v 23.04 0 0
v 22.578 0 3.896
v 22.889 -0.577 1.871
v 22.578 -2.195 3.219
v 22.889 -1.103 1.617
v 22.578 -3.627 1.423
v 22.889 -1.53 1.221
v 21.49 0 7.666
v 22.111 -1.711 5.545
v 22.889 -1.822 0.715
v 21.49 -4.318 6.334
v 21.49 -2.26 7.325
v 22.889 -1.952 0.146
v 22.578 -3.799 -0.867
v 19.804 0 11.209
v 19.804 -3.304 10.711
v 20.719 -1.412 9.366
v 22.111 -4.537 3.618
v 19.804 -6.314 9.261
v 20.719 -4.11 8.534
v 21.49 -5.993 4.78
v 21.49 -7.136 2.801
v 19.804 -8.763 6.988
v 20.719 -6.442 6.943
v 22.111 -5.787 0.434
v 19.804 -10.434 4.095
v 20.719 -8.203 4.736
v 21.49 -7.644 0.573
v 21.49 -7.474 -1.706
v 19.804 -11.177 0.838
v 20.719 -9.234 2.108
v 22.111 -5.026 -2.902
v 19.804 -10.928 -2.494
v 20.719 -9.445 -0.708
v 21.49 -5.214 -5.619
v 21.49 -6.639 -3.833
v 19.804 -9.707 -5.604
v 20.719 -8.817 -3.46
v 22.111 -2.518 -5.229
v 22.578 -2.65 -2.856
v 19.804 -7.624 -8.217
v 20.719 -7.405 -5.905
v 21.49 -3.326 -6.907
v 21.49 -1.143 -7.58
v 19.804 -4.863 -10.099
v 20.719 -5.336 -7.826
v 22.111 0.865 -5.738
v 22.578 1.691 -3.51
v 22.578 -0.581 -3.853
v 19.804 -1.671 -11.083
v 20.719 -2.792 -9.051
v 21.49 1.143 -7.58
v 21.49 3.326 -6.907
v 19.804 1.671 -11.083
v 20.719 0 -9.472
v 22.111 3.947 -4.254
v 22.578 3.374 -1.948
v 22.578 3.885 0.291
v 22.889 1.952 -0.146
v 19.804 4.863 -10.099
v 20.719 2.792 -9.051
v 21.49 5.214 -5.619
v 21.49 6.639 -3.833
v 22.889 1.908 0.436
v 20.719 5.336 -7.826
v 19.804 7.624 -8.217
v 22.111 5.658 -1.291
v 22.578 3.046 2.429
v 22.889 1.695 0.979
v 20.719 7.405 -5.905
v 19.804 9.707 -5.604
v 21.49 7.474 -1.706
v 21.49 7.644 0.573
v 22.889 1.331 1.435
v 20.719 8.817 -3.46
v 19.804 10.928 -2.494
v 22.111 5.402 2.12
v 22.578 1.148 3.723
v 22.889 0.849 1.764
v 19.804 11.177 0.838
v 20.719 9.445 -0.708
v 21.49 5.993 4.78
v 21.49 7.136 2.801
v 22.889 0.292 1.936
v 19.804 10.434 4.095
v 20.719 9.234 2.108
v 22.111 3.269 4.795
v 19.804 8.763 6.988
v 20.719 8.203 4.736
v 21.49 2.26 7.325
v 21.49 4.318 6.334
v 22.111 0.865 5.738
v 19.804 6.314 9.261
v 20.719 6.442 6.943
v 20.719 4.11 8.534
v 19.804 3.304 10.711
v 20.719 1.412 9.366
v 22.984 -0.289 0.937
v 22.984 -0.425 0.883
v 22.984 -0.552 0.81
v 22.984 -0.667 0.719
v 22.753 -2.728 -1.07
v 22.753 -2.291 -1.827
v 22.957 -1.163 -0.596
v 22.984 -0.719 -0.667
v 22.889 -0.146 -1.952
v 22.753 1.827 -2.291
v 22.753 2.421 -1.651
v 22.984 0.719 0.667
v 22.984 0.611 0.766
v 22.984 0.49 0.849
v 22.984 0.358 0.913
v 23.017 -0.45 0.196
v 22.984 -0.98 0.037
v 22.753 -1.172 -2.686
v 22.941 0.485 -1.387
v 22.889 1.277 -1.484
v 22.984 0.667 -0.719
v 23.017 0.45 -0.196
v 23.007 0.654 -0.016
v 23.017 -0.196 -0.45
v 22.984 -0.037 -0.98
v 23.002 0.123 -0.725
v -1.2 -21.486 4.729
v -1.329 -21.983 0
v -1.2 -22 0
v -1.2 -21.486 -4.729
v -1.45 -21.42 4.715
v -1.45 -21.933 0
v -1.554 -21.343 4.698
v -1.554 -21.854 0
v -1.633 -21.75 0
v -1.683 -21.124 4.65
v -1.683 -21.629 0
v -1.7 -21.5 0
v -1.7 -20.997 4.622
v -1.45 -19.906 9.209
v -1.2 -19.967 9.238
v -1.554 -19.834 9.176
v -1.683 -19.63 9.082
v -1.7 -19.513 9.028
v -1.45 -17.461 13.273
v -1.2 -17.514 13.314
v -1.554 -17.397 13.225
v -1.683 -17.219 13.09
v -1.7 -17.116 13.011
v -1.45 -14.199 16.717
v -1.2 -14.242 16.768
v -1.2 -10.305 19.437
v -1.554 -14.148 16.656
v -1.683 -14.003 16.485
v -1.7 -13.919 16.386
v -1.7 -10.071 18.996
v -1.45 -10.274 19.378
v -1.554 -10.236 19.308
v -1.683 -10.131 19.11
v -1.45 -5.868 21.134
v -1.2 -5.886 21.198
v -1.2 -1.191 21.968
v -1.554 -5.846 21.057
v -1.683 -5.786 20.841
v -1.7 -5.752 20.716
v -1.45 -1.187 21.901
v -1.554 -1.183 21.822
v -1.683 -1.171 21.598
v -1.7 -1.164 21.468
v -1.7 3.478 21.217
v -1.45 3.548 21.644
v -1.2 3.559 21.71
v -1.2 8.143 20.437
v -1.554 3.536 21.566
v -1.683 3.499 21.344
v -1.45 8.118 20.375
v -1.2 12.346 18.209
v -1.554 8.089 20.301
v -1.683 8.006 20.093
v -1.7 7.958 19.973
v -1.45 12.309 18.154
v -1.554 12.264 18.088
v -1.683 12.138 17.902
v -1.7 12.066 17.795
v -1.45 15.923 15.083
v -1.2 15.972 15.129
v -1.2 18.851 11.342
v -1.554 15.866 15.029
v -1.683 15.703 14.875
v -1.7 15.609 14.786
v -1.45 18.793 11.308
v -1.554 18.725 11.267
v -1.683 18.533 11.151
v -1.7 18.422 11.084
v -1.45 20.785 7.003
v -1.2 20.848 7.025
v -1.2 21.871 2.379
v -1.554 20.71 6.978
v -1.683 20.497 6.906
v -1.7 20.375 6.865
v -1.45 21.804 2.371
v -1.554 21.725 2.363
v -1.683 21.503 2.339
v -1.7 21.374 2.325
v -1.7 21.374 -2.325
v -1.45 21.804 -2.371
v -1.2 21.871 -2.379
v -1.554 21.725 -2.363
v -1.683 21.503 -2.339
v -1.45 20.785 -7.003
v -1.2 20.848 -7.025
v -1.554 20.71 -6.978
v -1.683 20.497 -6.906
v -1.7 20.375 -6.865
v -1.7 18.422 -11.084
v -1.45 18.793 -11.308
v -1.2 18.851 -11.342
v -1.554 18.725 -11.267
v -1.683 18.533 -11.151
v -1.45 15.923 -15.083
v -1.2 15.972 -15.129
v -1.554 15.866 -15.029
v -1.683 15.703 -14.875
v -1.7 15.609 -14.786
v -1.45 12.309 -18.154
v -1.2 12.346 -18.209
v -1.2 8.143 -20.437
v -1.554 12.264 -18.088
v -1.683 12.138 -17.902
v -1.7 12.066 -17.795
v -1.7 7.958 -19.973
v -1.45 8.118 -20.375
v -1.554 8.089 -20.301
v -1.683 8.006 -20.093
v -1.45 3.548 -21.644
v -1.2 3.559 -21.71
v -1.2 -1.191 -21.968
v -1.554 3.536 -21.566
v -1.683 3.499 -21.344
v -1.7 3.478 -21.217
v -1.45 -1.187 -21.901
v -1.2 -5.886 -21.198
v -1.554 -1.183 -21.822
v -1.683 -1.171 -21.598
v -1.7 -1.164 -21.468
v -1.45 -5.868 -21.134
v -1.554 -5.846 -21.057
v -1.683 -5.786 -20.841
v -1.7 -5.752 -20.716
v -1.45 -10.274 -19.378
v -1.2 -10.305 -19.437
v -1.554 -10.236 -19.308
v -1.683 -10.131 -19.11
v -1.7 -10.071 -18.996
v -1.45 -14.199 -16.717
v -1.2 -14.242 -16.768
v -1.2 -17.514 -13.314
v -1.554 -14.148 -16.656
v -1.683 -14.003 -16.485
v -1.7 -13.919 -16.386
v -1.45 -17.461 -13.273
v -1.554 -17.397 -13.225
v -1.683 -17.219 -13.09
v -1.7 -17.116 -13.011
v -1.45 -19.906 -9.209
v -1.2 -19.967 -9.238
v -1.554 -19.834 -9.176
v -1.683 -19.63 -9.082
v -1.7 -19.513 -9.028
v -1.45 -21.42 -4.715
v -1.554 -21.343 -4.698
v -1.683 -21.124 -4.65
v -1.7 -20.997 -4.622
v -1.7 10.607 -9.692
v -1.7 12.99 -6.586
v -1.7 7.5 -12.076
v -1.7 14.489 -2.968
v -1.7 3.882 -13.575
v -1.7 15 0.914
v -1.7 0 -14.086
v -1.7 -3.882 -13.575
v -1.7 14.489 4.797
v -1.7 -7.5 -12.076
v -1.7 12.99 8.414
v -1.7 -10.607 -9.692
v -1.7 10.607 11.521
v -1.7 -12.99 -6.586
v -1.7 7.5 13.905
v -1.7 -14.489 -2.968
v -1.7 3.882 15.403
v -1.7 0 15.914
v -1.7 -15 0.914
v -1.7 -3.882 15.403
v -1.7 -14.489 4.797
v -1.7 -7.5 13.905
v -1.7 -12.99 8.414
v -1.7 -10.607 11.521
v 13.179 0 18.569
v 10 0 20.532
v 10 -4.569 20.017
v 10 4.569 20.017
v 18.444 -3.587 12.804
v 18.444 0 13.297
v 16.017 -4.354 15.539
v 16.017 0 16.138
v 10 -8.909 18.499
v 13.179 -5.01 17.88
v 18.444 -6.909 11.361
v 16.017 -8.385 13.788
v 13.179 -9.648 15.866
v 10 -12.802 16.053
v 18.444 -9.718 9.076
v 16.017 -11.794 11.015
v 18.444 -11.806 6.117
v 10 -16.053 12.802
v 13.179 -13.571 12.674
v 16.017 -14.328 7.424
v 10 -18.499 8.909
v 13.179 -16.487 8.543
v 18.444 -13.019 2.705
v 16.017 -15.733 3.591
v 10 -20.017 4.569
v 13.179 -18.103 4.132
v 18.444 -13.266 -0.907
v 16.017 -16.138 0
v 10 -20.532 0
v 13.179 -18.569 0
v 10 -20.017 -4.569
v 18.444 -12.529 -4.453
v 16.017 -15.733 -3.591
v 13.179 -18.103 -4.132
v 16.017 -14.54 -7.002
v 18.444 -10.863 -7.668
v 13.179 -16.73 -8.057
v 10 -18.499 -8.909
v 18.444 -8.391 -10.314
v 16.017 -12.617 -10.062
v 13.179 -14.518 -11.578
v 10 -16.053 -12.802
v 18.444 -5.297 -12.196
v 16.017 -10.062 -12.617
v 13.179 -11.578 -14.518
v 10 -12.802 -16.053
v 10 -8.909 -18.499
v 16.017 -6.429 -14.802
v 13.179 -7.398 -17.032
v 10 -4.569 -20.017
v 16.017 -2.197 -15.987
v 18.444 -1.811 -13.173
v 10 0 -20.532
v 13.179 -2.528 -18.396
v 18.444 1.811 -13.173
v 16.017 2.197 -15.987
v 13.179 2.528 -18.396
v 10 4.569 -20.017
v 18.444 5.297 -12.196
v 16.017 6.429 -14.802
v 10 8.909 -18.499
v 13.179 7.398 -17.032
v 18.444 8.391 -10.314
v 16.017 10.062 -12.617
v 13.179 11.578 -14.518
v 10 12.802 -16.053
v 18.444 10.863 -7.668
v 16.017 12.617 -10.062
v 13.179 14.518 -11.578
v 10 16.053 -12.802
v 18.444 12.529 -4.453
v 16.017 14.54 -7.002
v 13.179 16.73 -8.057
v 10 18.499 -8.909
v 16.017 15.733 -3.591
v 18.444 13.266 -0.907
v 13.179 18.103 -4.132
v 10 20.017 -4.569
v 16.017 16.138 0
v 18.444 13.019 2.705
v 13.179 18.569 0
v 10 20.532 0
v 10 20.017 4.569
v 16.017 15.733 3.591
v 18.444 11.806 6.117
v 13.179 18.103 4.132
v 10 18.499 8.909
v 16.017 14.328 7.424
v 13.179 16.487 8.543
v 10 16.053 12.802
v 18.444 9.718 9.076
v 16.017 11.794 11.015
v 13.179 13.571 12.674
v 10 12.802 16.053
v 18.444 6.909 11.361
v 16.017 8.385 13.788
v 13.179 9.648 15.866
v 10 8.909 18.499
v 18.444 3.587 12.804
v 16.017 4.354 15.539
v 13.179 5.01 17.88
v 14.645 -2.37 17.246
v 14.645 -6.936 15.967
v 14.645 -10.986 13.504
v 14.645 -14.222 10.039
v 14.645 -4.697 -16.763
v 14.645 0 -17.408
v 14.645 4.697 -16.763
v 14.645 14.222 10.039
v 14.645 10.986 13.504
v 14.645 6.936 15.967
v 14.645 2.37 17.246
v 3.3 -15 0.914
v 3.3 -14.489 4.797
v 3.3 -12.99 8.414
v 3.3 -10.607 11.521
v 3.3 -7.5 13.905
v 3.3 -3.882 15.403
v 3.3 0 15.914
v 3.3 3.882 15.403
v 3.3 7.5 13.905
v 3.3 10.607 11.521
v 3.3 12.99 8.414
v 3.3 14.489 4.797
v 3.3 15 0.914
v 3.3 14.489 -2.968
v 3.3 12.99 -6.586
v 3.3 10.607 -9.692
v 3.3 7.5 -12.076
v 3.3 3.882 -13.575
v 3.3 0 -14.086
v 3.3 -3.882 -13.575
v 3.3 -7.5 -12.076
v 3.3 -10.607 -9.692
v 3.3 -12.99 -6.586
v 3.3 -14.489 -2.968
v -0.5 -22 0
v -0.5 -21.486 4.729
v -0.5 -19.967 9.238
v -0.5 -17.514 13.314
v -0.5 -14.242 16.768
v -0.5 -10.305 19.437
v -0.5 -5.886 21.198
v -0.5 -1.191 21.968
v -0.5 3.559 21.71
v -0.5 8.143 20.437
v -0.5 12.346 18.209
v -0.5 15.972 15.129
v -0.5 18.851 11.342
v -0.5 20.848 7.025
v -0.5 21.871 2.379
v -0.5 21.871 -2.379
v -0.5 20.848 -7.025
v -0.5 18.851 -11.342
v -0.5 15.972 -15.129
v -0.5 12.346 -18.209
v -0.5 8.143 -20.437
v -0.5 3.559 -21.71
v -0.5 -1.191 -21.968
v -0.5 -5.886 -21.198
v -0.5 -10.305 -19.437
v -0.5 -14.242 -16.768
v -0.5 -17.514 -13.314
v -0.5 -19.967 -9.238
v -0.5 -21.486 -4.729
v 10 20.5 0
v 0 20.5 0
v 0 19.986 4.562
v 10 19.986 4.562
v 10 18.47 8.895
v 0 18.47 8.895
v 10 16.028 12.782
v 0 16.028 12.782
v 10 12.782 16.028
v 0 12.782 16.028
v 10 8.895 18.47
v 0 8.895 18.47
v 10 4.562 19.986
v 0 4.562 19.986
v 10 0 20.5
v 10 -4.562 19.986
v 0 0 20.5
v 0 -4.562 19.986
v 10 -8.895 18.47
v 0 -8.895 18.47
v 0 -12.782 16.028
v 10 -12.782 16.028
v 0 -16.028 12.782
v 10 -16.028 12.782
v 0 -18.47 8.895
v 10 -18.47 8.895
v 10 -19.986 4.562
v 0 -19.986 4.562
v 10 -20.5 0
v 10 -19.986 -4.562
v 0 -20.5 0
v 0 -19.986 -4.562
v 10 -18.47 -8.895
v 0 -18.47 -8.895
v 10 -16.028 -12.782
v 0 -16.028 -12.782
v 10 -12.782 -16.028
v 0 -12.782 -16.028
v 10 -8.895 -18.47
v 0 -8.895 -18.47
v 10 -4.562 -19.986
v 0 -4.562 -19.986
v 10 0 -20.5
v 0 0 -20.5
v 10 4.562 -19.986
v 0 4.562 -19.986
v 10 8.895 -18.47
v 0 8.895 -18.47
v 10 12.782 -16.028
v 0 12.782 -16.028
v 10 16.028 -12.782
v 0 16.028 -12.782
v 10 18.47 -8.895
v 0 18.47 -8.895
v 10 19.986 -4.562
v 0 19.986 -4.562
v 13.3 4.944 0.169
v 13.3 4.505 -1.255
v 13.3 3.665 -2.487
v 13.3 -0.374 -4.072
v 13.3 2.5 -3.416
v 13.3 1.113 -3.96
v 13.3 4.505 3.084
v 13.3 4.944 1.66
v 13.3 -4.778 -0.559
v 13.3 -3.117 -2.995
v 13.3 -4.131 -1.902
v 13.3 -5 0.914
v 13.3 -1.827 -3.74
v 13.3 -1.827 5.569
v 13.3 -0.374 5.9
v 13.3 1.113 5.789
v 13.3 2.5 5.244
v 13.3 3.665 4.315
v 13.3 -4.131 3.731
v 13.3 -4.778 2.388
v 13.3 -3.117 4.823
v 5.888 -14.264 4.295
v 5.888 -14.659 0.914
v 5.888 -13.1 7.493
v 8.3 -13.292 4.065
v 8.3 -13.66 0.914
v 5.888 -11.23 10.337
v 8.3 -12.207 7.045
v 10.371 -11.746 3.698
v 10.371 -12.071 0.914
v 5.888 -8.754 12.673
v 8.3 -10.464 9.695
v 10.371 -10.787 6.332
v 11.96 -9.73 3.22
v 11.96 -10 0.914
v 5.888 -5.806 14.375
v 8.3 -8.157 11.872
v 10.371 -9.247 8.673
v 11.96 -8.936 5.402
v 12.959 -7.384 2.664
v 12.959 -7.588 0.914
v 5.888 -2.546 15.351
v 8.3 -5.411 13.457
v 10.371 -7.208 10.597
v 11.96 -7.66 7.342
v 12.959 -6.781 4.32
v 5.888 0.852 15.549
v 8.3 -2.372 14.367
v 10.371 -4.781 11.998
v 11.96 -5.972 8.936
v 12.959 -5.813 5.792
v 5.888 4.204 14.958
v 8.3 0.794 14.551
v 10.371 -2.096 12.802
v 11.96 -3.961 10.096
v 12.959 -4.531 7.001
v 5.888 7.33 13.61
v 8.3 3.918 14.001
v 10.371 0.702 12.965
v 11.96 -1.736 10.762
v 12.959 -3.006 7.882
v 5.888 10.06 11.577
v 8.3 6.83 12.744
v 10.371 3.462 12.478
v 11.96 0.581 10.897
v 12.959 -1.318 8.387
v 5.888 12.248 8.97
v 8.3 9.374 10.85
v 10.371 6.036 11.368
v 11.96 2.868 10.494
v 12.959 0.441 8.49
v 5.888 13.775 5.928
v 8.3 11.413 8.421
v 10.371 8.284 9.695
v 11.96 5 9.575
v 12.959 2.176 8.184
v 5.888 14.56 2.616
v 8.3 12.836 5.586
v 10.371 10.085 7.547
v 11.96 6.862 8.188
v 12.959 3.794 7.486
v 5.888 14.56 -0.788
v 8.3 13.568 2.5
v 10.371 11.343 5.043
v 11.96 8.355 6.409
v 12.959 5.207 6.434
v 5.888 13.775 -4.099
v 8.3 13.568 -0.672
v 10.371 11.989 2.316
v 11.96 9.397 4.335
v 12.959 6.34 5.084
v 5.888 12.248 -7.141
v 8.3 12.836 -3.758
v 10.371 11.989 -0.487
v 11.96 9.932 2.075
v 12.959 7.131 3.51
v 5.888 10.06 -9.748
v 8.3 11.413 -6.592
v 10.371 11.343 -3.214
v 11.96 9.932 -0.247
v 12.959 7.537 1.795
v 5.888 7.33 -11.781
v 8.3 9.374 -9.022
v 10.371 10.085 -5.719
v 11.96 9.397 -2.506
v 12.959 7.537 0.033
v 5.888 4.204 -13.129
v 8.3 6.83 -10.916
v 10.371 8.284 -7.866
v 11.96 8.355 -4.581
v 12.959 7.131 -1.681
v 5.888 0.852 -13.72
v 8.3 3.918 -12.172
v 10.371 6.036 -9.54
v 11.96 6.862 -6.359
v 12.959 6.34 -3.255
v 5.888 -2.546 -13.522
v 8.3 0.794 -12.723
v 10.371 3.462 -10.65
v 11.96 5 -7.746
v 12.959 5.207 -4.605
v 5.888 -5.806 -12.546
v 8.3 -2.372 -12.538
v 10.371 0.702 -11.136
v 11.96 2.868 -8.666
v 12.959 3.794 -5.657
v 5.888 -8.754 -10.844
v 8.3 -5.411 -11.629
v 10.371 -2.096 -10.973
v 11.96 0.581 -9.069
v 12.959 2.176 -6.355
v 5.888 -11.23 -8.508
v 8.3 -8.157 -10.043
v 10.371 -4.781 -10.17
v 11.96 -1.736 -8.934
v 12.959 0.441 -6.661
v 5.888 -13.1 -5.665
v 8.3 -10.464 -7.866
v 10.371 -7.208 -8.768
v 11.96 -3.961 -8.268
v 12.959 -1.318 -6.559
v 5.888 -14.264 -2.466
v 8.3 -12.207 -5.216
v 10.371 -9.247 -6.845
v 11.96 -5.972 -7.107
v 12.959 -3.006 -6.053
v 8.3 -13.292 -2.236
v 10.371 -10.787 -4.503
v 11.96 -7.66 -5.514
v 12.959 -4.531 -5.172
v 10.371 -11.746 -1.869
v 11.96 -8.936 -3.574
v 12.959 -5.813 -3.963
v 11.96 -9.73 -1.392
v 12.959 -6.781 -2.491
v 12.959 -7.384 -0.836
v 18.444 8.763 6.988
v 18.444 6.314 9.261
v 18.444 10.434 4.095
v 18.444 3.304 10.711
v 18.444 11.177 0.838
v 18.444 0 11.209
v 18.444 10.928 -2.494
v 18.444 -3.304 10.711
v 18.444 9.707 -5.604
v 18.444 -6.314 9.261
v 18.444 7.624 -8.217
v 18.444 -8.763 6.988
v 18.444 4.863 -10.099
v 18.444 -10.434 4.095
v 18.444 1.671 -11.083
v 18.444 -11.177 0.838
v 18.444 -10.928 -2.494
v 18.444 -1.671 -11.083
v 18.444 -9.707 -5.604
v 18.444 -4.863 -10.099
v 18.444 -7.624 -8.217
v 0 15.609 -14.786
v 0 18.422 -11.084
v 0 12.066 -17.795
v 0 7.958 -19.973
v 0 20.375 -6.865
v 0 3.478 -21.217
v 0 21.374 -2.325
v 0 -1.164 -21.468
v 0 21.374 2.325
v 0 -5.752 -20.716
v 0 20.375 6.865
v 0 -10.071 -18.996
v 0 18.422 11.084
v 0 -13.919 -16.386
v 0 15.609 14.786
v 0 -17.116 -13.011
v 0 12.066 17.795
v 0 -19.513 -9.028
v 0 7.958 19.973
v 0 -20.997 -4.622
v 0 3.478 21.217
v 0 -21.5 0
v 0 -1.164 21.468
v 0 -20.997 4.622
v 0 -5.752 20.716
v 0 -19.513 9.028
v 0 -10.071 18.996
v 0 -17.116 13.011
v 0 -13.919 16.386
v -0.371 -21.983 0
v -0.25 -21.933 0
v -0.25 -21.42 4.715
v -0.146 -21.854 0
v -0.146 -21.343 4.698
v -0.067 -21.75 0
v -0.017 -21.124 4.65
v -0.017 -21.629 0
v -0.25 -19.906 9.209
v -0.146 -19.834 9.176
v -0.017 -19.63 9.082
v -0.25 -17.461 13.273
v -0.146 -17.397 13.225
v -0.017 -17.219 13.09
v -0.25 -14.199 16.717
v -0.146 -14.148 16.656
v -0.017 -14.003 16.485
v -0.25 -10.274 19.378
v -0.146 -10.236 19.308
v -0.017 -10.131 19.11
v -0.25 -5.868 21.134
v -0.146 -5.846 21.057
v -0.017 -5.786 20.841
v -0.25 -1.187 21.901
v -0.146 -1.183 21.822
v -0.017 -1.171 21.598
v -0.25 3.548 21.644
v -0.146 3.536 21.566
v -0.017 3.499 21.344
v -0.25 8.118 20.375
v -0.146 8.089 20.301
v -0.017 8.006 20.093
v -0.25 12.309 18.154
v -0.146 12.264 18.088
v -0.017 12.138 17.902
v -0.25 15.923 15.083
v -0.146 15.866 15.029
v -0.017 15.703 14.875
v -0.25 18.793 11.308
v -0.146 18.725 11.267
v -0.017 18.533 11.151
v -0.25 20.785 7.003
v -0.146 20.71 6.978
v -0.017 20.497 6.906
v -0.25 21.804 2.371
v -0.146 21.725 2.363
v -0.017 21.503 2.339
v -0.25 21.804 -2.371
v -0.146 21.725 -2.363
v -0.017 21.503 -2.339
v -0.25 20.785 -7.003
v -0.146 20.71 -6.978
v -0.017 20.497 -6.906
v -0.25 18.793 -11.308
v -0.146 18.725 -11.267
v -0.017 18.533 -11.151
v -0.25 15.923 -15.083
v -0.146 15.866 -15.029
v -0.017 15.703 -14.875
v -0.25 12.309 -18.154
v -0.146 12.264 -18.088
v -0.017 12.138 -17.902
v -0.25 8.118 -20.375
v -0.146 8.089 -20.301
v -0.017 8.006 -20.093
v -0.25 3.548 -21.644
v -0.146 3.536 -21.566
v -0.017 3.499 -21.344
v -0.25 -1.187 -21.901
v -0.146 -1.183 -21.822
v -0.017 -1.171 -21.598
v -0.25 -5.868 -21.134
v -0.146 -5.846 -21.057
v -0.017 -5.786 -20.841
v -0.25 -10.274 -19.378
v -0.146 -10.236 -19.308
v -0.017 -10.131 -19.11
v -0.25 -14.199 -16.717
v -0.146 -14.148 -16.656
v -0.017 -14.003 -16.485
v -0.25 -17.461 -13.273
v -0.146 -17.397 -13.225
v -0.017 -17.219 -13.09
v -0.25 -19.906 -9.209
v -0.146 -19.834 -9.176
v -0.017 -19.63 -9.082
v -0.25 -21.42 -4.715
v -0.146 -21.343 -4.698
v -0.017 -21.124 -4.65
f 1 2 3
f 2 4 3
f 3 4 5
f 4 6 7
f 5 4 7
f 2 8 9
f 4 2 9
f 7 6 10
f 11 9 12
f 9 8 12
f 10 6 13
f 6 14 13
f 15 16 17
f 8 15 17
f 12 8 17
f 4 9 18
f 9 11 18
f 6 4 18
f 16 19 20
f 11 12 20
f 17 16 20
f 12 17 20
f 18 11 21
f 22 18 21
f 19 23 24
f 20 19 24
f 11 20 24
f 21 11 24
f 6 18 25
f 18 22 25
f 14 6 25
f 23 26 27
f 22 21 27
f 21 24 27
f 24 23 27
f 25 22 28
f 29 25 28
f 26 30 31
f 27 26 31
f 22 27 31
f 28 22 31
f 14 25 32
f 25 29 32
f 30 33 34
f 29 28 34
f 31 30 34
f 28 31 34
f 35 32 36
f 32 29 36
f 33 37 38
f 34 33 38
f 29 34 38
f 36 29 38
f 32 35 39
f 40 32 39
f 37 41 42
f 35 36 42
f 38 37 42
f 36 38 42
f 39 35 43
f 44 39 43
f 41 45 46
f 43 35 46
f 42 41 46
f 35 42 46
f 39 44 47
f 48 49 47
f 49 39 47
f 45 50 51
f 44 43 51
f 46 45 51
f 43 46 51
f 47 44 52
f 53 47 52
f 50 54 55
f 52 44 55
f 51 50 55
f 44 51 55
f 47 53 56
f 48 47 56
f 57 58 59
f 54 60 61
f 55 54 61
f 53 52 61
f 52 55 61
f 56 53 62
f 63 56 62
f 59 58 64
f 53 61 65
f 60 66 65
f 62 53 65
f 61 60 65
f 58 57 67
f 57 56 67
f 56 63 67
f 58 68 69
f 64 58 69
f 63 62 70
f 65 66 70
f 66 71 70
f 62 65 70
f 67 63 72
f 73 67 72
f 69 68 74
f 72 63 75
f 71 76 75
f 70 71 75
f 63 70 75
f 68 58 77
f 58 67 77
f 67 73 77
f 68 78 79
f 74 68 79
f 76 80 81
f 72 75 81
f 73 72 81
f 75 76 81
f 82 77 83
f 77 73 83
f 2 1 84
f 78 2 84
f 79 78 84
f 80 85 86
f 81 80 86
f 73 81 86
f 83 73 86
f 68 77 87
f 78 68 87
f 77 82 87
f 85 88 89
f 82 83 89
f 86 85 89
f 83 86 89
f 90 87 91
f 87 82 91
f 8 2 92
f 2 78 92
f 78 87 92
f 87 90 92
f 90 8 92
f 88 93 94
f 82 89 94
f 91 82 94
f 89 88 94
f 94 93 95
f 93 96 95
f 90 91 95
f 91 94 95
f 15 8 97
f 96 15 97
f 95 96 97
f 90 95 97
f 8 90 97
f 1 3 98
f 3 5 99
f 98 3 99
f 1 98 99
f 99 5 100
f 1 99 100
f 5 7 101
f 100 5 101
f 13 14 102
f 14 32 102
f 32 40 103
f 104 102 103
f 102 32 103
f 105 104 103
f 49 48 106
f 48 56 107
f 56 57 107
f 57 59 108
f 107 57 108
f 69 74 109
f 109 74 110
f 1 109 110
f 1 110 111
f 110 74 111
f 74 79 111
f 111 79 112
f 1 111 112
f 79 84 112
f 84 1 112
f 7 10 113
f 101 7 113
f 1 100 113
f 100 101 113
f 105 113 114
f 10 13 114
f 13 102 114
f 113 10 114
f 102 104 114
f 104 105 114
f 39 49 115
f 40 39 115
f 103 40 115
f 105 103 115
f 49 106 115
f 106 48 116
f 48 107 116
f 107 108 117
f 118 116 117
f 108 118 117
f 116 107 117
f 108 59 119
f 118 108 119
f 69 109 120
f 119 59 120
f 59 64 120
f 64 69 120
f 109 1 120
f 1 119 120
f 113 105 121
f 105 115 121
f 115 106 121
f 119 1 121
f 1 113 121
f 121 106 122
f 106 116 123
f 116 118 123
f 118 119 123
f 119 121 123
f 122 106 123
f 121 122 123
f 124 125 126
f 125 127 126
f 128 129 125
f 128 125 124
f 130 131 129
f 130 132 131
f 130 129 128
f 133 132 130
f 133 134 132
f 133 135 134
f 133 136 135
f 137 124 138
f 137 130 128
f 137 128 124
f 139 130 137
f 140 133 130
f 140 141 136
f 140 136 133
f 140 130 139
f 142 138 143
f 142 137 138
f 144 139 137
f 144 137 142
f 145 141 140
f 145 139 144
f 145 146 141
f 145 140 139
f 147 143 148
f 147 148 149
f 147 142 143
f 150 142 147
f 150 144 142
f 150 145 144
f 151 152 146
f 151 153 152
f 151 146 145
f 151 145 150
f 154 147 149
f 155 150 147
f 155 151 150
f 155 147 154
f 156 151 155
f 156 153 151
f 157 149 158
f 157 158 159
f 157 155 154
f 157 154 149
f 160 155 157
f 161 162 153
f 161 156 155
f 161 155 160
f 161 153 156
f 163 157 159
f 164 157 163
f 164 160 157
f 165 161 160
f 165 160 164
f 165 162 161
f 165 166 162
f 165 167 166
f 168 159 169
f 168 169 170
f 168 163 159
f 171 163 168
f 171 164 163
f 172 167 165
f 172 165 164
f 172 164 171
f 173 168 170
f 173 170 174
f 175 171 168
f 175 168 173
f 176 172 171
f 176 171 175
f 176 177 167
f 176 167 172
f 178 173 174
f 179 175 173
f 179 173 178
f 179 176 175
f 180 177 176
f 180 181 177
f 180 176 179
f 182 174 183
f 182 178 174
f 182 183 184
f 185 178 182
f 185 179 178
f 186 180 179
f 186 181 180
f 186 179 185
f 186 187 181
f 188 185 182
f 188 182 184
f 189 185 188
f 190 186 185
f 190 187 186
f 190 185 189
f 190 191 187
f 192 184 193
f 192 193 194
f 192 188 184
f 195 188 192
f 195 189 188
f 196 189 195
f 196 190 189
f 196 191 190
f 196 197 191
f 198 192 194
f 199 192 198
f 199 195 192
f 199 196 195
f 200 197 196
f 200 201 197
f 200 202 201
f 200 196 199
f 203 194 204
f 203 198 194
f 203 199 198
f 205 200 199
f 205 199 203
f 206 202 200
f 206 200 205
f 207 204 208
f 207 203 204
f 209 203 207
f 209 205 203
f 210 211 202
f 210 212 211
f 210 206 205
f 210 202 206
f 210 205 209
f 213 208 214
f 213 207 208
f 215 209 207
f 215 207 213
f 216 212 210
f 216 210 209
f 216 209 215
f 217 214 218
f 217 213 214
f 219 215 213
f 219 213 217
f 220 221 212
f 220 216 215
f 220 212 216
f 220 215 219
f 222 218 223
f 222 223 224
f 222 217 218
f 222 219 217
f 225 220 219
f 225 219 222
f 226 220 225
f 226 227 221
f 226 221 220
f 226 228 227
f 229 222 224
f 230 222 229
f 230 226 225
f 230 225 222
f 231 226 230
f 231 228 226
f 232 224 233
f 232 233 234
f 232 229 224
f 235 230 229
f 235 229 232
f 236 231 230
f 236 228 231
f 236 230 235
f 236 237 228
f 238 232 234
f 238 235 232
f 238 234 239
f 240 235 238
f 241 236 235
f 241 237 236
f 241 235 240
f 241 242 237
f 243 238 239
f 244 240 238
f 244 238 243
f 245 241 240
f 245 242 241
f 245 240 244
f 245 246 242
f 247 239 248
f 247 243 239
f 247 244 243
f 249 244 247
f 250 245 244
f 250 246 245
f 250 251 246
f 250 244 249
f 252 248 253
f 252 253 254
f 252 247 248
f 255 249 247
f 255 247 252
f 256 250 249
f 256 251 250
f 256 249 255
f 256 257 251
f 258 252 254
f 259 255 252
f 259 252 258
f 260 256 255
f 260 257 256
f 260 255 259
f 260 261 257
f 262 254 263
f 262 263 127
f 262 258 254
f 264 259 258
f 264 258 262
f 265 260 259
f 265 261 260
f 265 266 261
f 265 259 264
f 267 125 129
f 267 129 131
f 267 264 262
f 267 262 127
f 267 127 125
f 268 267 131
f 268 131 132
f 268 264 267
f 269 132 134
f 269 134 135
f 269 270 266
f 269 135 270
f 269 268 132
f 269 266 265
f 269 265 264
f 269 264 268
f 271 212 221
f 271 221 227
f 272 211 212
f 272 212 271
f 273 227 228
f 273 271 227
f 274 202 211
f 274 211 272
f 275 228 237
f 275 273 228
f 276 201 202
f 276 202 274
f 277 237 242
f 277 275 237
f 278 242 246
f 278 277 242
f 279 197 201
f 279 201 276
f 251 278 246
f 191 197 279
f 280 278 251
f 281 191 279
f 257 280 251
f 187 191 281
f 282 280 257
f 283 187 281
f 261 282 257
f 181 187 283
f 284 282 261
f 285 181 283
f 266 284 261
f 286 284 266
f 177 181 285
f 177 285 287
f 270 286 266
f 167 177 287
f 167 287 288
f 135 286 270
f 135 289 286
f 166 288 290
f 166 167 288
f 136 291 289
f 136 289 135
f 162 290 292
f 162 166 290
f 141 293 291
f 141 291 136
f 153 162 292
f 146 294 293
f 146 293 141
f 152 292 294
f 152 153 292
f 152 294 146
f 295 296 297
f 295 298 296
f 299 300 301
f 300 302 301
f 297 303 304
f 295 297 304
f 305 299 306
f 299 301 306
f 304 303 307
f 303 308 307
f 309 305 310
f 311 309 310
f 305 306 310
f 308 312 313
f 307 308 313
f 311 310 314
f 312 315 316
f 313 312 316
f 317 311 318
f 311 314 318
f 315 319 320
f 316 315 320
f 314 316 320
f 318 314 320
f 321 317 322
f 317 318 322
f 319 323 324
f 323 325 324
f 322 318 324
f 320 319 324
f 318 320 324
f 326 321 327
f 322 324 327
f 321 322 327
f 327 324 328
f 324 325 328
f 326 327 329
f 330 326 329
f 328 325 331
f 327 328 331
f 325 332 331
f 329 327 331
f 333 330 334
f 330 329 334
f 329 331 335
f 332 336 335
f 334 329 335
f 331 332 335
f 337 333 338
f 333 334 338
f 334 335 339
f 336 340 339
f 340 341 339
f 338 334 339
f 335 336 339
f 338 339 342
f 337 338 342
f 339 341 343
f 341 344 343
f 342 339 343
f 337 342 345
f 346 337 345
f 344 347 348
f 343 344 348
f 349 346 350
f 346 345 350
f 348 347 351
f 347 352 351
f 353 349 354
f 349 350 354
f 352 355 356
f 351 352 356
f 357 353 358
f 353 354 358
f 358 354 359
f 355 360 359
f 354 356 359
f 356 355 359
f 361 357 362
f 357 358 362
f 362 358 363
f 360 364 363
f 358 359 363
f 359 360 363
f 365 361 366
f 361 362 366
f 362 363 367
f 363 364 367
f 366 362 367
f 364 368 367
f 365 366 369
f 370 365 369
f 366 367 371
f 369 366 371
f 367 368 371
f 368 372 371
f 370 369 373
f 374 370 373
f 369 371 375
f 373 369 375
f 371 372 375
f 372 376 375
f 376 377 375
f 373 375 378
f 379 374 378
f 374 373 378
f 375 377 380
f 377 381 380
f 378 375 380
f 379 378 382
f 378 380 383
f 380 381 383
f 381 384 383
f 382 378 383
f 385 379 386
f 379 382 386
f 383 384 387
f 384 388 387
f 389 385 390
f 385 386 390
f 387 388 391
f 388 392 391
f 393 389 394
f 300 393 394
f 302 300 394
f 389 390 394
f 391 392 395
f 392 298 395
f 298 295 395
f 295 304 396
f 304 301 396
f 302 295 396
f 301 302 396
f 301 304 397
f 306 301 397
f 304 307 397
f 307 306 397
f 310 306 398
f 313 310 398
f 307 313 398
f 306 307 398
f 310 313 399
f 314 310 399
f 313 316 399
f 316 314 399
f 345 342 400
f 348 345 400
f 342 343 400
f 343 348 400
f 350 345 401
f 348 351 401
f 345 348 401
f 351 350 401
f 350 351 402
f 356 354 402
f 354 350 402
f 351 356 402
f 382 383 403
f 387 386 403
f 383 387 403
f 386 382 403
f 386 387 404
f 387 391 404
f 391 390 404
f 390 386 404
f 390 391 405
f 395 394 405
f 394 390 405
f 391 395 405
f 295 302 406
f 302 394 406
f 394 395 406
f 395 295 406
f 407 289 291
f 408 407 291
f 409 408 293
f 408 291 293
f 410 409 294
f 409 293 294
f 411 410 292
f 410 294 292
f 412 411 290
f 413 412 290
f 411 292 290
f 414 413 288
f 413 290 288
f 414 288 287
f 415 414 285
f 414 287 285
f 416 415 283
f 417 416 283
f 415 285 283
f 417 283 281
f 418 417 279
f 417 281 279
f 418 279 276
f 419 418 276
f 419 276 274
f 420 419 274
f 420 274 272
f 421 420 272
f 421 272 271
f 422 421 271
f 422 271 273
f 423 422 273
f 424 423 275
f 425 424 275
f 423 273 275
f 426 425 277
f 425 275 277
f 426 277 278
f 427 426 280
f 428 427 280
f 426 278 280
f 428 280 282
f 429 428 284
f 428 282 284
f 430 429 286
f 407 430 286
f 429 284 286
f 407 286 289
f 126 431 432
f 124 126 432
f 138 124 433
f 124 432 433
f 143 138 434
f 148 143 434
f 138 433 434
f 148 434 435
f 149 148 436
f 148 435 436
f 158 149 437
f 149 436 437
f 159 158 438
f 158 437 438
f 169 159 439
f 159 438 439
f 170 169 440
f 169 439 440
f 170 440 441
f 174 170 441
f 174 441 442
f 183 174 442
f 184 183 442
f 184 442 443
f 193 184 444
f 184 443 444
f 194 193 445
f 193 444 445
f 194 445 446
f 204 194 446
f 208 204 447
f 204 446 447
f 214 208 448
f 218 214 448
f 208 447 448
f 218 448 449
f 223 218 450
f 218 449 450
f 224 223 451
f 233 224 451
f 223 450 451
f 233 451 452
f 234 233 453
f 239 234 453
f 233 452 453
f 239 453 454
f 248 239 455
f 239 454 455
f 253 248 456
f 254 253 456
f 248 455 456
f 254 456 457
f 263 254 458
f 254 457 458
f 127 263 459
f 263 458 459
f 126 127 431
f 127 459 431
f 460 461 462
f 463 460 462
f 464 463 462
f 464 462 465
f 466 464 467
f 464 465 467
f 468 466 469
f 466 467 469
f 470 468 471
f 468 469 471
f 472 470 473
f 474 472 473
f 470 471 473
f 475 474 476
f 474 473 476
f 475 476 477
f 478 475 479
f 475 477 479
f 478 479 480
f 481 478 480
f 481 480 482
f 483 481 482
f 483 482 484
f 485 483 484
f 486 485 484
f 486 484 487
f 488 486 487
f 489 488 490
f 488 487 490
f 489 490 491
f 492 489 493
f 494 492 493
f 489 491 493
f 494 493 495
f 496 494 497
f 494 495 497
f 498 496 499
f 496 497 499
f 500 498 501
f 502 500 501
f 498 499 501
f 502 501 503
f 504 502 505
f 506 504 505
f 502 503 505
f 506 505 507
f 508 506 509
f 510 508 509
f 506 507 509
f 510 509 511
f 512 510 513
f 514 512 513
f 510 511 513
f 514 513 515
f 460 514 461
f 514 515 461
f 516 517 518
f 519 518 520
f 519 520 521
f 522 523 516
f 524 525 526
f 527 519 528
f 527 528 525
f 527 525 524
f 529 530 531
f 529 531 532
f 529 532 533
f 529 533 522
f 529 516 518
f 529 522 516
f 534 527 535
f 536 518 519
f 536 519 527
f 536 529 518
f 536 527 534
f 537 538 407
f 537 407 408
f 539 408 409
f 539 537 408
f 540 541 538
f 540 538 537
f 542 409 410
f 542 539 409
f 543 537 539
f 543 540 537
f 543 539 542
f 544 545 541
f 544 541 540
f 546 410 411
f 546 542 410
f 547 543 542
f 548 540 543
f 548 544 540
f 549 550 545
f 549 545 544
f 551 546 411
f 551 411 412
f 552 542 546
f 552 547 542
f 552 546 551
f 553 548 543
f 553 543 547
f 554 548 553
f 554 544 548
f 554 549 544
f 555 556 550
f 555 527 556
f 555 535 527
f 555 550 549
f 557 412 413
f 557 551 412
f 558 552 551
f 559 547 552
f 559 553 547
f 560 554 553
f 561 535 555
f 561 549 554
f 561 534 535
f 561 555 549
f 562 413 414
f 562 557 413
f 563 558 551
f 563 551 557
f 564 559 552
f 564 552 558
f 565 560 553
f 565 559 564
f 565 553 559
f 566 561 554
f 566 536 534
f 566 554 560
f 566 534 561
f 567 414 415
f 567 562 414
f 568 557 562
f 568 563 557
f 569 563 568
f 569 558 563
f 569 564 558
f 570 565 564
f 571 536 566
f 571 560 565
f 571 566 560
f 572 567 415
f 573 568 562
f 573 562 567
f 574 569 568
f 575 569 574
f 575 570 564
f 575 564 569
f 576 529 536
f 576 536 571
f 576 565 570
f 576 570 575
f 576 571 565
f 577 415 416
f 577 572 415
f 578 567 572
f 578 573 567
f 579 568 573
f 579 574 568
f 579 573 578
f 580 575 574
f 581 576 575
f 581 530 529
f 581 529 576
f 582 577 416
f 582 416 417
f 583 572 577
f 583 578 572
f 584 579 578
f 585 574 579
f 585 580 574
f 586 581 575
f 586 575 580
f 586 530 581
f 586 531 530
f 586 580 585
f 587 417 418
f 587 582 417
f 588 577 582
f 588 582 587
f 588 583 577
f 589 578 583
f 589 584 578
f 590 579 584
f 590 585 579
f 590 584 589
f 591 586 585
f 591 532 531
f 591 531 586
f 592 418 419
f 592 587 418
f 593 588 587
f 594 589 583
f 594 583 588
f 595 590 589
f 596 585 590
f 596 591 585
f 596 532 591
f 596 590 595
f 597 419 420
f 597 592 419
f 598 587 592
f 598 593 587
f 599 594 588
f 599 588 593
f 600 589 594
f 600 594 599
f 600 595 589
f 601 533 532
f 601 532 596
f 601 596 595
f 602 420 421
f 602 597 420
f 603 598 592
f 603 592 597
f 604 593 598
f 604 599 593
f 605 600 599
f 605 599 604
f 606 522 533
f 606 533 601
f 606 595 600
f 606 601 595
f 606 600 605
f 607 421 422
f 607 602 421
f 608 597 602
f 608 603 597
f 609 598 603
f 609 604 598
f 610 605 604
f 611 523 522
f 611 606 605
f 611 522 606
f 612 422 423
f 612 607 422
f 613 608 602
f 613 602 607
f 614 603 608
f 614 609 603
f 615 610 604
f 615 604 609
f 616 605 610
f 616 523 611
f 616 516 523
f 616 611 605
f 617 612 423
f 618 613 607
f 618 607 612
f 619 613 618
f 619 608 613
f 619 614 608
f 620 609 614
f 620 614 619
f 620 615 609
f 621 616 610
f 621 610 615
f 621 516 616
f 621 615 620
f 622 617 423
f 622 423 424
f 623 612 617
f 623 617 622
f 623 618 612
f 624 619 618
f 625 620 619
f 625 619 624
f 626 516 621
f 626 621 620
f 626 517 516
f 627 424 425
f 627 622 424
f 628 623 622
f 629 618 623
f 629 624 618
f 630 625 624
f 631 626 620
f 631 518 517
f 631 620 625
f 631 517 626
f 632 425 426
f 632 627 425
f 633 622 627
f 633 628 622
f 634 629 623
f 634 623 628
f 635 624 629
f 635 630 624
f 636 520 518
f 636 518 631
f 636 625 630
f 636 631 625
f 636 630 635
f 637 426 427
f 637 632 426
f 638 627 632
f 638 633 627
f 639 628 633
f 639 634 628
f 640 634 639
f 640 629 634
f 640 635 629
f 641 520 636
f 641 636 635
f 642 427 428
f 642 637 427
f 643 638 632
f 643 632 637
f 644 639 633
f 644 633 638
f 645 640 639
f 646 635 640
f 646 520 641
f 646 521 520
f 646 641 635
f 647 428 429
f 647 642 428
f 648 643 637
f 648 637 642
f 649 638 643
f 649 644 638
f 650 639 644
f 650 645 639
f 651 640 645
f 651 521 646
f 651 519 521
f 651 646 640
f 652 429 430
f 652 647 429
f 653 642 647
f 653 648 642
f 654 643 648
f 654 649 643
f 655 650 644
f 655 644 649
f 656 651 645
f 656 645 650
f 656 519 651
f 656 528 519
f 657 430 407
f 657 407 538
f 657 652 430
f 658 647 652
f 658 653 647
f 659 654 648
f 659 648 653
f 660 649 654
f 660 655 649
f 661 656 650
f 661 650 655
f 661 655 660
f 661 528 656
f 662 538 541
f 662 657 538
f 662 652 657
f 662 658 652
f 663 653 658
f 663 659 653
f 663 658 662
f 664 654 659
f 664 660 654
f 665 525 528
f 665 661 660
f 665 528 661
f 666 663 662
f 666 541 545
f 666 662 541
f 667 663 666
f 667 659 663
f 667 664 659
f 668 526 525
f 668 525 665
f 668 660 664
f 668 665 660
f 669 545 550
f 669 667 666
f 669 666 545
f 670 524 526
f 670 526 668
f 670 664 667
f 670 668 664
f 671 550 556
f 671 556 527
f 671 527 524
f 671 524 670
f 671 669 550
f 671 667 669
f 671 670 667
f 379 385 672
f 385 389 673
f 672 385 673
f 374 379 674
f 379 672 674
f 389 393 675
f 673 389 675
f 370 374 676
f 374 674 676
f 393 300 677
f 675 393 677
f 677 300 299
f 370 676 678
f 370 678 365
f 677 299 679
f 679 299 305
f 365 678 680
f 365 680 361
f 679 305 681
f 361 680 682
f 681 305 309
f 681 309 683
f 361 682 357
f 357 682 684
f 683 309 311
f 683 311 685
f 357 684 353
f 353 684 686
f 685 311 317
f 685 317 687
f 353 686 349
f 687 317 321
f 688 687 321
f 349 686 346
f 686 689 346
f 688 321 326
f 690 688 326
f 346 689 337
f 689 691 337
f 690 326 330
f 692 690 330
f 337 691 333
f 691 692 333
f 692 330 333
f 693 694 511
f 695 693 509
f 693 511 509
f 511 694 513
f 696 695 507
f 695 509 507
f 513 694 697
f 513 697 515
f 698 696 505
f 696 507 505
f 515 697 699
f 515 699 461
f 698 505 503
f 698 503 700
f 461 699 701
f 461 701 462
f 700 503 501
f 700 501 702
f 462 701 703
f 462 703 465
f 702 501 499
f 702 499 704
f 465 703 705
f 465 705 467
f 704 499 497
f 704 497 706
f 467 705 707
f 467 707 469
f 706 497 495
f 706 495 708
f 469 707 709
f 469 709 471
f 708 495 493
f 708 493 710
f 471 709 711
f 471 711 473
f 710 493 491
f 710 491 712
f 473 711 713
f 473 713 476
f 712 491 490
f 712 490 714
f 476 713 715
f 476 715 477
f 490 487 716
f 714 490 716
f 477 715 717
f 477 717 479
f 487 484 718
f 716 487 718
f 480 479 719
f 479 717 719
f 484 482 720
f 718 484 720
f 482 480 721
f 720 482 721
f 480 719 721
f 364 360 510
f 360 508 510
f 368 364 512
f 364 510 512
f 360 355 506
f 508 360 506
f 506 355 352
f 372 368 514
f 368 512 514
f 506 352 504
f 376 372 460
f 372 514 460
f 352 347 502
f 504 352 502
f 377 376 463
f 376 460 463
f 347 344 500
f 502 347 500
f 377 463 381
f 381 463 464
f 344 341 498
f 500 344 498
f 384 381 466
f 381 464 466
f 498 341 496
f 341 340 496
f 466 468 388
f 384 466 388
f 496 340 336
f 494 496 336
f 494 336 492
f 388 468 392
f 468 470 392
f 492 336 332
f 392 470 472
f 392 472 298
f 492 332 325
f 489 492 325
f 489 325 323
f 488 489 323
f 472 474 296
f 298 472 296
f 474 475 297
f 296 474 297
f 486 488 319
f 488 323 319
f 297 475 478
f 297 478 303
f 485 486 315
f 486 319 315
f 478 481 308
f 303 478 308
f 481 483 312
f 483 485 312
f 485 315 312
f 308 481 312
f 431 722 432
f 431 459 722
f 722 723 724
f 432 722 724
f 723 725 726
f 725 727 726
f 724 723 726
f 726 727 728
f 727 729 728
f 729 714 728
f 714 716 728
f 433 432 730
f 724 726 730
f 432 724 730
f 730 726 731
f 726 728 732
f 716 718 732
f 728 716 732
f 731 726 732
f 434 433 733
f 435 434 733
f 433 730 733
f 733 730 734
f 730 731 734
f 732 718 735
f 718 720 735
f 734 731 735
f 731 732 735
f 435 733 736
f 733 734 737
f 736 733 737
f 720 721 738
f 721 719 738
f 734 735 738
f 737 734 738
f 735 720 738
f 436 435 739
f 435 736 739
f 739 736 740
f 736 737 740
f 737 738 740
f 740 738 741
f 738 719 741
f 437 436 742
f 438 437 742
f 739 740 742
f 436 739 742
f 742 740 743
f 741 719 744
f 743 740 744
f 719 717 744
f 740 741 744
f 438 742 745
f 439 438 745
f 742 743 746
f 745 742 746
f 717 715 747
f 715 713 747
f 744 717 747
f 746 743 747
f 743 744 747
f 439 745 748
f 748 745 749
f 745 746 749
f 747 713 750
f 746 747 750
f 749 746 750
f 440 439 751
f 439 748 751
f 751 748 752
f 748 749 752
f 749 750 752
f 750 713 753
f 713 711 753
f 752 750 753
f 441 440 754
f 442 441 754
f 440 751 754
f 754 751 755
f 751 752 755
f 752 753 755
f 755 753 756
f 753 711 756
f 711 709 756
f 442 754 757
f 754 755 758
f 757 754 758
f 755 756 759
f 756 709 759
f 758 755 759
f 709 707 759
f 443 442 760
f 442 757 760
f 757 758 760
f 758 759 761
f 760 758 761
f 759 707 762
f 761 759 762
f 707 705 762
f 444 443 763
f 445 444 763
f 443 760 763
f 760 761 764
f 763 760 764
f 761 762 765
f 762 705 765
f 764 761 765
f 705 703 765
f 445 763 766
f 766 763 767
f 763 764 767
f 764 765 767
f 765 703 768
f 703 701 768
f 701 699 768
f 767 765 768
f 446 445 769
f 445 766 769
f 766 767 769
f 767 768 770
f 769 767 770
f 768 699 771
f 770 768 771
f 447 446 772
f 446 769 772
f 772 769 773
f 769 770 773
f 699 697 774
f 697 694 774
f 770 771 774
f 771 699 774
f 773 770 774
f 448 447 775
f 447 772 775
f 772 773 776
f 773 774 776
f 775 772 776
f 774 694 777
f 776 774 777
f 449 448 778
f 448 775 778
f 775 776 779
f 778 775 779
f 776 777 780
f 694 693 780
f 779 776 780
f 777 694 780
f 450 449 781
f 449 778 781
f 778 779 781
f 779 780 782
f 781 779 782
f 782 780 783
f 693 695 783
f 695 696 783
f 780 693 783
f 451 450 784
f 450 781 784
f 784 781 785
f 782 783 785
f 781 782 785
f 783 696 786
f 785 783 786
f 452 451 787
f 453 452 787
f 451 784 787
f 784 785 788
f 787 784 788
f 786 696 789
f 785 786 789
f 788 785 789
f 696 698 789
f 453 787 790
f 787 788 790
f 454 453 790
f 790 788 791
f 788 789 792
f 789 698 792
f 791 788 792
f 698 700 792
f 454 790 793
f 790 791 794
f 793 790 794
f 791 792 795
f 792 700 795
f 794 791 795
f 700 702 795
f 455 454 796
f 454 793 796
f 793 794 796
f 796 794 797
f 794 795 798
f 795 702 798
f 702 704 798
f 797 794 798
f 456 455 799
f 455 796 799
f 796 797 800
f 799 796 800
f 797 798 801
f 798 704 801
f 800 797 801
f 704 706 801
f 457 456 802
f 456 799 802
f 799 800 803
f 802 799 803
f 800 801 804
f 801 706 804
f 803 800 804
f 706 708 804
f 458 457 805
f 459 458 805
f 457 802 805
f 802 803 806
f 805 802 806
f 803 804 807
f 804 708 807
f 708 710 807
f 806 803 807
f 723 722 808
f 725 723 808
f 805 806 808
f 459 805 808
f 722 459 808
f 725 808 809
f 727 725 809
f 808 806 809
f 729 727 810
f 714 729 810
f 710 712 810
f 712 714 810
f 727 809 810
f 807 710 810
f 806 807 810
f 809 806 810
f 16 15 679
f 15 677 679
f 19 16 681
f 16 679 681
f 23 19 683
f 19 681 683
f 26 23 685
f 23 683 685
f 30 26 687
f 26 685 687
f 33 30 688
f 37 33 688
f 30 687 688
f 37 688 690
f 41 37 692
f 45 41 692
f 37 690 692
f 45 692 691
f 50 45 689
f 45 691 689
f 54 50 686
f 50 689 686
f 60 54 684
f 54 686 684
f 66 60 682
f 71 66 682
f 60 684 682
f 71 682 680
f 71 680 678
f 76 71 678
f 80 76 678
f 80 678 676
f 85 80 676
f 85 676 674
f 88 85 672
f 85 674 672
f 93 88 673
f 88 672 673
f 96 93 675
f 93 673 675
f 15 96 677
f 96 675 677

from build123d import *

# Parameters (mm, degrees)
F0_R     = 20.5
F1_DEPTH = 10
F4_R     = 22
F5_DEPTH = 1.7
F6_R     = 0.5
F7_R     = 15
F8_DEPTH = 15
F9_R     = 10


with BuildPart() as f1:
    # F0 (on Right) → F1 (new body)
    with BuildSketch(Plane.YZ):
        Circle(F0_R)
    extrude(amount=F1_DEPTH)

    # F2 (on Front) → F3 (revolve)
    with BuildSketch(Plane.XZ):
        with BuildLine():
            Line((10, 0), (23.039928, 0))
            ThreePointArc((23.039928, 0), (22.111209, 5.803276), (19.804215, 11.208673))
            Line((19.804215, 11.208673), (18.443597, 11.208673))
            Line((18.443597, 11.208673), (18.443597, 13.296706))
            ThreePointArc((18.443597, 13.296706), (14.6452, 17.40848), (10, 20.532038))
            Line((10, 20.532038), (10, 0))
        make_face()
    revolve(axis=Axis((11.340726, 0, 0), (1, 0, 0)))

    # F4 (on face) → F5 (join)
    with BuildSketch(Plane(origin=(0, 0, 0), x_dir=(0, -1, 0), z_dir=(-1, 0, 0))):
        Circle(F4_R)
    extrude(amount=F5_DEPTH)

    # F6
    f6_edges = [f1.edges().sort_by_distance(p)[0] for p in [
        (-1.7, 22, 0),
        (0, 22, 0),
    ]]
    fillet(f6_edges, radius=F6_R)

    # F7 (on face) → F8 (cut)
    with BuildSketch(Plane(origin=(-1.7, 0, 0), x_dir=(0, -1, 0), z_dir=(-1, 0, 0))):
        with Locations((0, 0.914327)):
            Circle(F7_R)
    extrude(amount=-F8_DEPTH, mode=Mode.SUBTRACT)

    # F9
    f9_edges = [f1.edges().sort_by_distance(p)[0] for p in [
        (13.3, 15, 0.914327),
    ]]
    fillet(f9_edges, radius=F9_R)


solid = f1.part
